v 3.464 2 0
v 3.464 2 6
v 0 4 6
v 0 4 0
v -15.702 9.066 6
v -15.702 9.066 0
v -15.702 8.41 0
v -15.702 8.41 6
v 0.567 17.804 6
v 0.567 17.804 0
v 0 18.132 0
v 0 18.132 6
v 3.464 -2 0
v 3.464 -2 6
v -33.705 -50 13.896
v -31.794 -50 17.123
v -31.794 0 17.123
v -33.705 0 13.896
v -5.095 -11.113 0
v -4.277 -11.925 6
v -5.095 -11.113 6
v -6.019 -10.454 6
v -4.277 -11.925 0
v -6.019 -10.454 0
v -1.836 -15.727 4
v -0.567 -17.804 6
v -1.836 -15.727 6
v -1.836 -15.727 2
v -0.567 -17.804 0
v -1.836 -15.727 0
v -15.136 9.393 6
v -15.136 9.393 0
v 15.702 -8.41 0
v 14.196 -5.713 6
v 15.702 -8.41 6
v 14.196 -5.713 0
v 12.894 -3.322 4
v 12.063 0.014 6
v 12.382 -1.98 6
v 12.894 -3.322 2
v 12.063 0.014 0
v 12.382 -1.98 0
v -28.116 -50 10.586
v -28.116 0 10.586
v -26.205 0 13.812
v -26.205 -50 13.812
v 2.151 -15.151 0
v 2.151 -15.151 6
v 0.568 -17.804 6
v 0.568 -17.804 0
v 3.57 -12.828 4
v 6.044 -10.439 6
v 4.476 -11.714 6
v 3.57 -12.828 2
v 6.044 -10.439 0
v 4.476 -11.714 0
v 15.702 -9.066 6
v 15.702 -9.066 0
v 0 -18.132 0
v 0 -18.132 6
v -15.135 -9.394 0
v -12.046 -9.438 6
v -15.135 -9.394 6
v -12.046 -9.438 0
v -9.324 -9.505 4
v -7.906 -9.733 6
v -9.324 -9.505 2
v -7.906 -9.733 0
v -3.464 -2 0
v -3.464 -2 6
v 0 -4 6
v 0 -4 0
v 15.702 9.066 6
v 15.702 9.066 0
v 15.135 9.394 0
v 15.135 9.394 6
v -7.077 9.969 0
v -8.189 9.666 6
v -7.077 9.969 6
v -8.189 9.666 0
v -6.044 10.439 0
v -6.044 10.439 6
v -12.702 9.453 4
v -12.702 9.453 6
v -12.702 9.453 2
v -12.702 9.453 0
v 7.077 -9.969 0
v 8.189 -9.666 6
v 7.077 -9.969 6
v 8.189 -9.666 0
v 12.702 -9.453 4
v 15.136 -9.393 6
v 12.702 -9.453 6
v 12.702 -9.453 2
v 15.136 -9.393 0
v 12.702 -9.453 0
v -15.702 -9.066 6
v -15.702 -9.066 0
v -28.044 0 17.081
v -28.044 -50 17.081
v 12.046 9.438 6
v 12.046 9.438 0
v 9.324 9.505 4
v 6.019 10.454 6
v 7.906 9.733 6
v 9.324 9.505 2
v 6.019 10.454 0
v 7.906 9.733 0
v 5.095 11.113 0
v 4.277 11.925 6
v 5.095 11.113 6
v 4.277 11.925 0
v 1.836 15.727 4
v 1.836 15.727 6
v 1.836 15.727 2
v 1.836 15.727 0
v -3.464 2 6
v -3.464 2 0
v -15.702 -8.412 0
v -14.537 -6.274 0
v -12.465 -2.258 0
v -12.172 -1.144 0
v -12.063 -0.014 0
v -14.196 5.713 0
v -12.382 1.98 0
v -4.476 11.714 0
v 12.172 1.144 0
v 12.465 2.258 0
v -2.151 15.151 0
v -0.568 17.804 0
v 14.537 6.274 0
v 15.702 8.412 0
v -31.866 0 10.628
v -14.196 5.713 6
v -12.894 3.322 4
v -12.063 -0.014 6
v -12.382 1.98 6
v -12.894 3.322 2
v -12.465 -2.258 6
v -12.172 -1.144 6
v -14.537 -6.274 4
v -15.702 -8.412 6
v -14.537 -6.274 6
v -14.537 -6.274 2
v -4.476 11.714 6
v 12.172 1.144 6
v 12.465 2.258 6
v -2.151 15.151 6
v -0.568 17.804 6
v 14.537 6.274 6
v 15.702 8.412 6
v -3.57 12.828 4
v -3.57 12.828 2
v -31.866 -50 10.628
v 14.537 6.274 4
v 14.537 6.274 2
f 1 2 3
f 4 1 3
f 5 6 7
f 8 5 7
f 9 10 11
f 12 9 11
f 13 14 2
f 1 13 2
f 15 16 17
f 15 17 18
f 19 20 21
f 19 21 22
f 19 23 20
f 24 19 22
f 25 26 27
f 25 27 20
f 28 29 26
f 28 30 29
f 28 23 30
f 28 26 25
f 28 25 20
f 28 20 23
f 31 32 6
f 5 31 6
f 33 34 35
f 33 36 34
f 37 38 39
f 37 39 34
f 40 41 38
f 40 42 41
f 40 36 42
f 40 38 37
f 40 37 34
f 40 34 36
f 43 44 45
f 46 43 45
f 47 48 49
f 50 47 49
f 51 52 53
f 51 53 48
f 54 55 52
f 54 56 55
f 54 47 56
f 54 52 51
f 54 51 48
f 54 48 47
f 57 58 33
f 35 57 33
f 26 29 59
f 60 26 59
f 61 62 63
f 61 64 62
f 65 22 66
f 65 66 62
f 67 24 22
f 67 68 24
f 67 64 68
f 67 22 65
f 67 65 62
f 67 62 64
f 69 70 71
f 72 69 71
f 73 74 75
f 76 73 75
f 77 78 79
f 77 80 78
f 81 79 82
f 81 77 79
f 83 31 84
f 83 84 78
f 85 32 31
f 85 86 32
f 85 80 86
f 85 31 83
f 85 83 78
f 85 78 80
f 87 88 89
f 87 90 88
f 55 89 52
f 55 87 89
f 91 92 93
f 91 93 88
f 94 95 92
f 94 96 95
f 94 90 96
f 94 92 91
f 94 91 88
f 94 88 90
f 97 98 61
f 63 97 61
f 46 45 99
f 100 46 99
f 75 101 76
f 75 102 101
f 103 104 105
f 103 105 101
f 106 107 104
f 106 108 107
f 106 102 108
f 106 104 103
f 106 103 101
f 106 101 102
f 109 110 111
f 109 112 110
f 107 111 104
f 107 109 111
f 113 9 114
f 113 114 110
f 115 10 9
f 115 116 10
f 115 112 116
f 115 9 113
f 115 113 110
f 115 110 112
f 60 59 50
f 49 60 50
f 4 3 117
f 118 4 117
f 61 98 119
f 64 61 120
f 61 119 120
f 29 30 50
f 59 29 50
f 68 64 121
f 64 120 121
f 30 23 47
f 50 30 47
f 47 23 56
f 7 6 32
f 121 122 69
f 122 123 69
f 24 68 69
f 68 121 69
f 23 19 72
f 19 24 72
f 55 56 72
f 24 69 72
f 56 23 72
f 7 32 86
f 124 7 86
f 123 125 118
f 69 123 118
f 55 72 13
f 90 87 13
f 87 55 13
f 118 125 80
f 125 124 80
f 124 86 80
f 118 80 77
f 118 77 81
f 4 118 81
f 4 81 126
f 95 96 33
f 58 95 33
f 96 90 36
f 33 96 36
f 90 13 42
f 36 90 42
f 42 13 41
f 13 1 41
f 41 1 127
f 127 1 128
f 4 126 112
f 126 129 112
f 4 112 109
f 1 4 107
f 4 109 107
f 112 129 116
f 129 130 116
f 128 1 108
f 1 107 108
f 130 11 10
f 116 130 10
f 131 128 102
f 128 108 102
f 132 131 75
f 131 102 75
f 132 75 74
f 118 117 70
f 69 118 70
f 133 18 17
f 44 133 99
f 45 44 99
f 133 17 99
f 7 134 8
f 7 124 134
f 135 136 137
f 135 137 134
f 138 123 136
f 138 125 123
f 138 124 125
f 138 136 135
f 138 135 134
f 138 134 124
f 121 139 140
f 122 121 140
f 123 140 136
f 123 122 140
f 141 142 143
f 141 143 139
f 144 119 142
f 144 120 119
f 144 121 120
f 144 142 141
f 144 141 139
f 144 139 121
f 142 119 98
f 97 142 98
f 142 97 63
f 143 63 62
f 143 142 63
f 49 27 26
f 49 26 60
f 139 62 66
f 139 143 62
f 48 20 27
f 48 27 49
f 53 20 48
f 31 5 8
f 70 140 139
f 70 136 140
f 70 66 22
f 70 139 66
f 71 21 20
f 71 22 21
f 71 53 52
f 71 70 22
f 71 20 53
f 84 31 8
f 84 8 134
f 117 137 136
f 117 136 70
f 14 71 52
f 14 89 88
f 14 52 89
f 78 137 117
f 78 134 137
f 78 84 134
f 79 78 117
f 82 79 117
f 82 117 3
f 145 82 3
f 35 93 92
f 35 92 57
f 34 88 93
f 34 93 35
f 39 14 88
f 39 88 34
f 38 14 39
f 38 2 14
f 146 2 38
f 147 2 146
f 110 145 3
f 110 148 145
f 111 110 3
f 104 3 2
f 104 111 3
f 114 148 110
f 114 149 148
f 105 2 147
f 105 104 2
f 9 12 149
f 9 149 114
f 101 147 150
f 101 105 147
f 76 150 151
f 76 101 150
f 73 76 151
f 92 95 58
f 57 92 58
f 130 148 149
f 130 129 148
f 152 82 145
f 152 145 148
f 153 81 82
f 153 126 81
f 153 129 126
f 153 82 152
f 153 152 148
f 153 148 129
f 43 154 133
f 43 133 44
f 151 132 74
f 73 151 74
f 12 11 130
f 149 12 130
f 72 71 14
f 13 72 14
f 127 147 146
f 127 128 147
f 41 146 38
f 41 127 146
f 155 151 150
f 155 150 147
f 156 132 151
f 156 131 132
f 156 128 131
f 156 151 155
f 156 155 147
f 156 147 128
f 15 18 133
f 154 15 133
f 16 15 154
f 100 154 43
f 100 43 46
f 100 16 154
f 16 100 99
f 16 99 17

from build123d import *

# Parameters (mm, degrees)
F1_DEPTH = 50
F3_DEPTH = 6
F5_DEPTH = 25


with BuildPart() as f1:
    # F0 (on Front) → F1 (new body)
    with BuildSketch(Plane.XZ):
        Polygon((-26.2049326301, 13.8121203759), (-28.0435276902, 17.0807340419), (-31.7935276902, 17.1227708456), (-33.7049326301, 13.8961939833), (-31.8663375699, 10.6275803172), (-28.1163375699, 10.5855435136), align=None)
    extrude(amount=F1_DEPTH)


with BuildPart() as f3:
    # F2 (on Top) → F3 (new body)
    with BuildSketch(Plane.XY):
        with BuildLine():
            Line((-12.0627175372, -0.0144388362), (-6.0438631676, 10.4394004078))
            add(Edge.make_bspline(
                [(-15.1358744038, 9.3928904921), (-13.4915543772, 9.7654312673), (-8.9864380154, 8.7432919796), (-6.0438631676, 10.4394004078)],
                knots=[0.0120150375, 0.0120150375, 0.0120150375, 0.0120150375, 0.0832761836, 0.0832761836, 0.0832761836, 0.0832761836], degree=3))
            Line((-15.1358744038, 9.3928904921), (-15.702418983, 9.0657958268))
            Line((-15.702418983, 9.0657958268), (-15.702418983, 8.4101986204))
            add(Edge.make_bspline(
                [(-12.0627175372, -0.0144388362), (-12.0602995384, 3.3869694731), (-15.2024796508, 6.7943184808), (-15.702418983, 8.4101986204)],
                knots=[0.9166095169, 0.9166095169, 0.9166095169, 0.9166095169, 0.9879757698, 0.9879757698, 0.9879757698, 0.9879757698], degree=3))
        make_face()
        Polygon((6.0438631676, -10.4394004078), (12.0627175372, 0.0144388362), (6.0188543696, 10.453839244), (-6.0438631676, 10.4394004078), (-12.0627175372, -0.0144388362), (-6.0188543696, -10.453839244), align=None)
        with BuildLine():
            add(Edge.make_bspline(
                [(0.5665445792, 17.8044969882), (1.7113343678, 16.5667444608), (3.0786939593, 12.1541296007), (6.0188543696, 10.453839244)],
                knots=[0.1786817042, 0.1786817042, 0.1786817042, 0.1786817042, 0.2499428502, 0.2499428502, 0.2499428502, 0.2499428502], degree=3))
            Line((0.5665445792, 17.8044969882), (0, 18.1315916535))
            Line((0, 18.1315916535), (-0.5677638354, 17.8037930503))
            add(Edge.make_bspline(
                [(-6.0438631676, 10.4394004078), (-3.0969481636, 12.1380105141), (-1.7171874196, 16.5628928185), (-0.5677638354, 17.8037930503)],
                knots=[0.0832761836, 0.0832761836, 0.0832761836, 0.0832761836, 0.1546424364, 0.1546424364, 0.1546424364, 0.1546424364], degree=3))
            Line((-6.0438631676, 10.4394004078), (6.0188543696, 10.453839244))
        make_face()
        with BuildLine():
            Line((15.702418983, 8.4116064961), (15.702418983, 9.0657958268))
            Line((15.702418983, 9.0657958268), (15.1346551476, 9.39359443))
            add(Edge.make_bspline(
                [(6.0188543696, 10.453839244), (8.9633513748, 8.751041041), (13.4852922312, 9.7685743377), (15.1346551476, 9.39359443)],
                knots=[0.2499428502, 0.2499428502, 0.2499428502, 0.2499428502, 0.3213091031, 0.3213091031, 0.3213091031, 0.3213091031], degree=3))
            Line((6.0188543696, 10.453839244), (12.0627175372, 0.0144388362))
            add(Edge.make_bspline(
                [(15.702418983, 8.4116064961), (15.2028887449, 6.8013131935), (12.0651319747, 3.4108376211), (12.0627175372, 0.0144388362)],
                knots=[0.3453483708, 0.3453483708, 0.3453483708, 0.3453483708, 0.4166095169, 0.4166095169, 0.4166095169, 0.4166095169], degree=3))
        make_face()
        with BuildLine():
            Line((15.702418983, -9.0657958268), (15.702418983, -8.4101986204))
            add(Edge.make_bspline(
                [(12.0627175372, 0.0144388362), (12.0602995384, -3.3869694731), (15.2024796508, -6.7943184808), (15.702418983, -8.4101986204)],
                knots=[0.4166095169, 0.4166095169, 0.4166095169, 0.4166095169, 0.4879757698, 0.4879757698, 0.4879757698, 0.4879757698], degree=3))
            Line((12.0627175372, 0.0144388362), (6.0438631676, -10.4394004078))
            add(Edge.make_bspline(
                [(15.1358744038, -9.3928904921), (13.4915543772, -9.7654312673), (8.9864380154, -8.7432919796), (6.0438631676, -10.4394004078)],
                knots=[0.5120150375, 0.5120150375, 0.5120150375, 0.5120150375, 0.5832761836, 0.5832761836, 0.5832761836, 0.5832761836], degree=3))
            Line((15.1358744038, -9.3928904921), (15.702418983, -9.0657958268))
        make_face()
        with BuildLine():
            add(Edge.make_bspline(
                [(6.0438631676, -10.4394004078), (3.0969481636, -12.1380105141), (1.7171874196, -16.5628928185), (0.5677638354, -17.8037930503)],
                knots=[0.5832761836, 0.5832761836, 0.5832761836, 0.5832761836, 0.6546424364, 0.6546424364, 0.6546424364, 0.6546424364], degree=3))
            Line((6.0438631676, -10.4394004078), (-6.0188543696, -10.453839244))
            add(Edge.make_bspline(
                [(-0.5665445792, -17.8044969882), (-1.7113343678, -16.5667444608), (-3.0786939593, -12.1541296007), (-6.0188543696, -10.453839244)],
                knots=[0.6786817042, 0.6786817042, 0.6786817042, 0.6786817042, 0.7499428502, 0.7499428502, 0.7499428502, 0.7499428502], degree=3))
            Line((-0.5665445792, -17.8044969882), (0, -18.1315916535))
            Line((0, -18.1315916535), (0.5677638354, -17.8037930503))
        make_face()
        with BuildLine():
            add(Edge.make_bspline(
                [(-6.0188543696, -10.453839244), (-8.9633513748, -8.751041041), (-13.4852922312, -9.7685743377), (-15.1346551476, -9.39359443)],
                knots=[0.7499428502, 0.7499428502, 0.7499428502, 0.7499428502, 0.8213091031, 0.8213091031, 0.8213091031, 0.8213091031], degree=3))
            Line((-6.0188543696, -10.453839244), (-12.0627175372, -0.0144388362))
            add(Edge.make_bspline(
                [(-15.702418983, -8.4116064961), (-15.2028887449, -6.8013131935), (-12.0651319747, -3.4108376211), (-12.0627175372, -0.0144388362)],
                knots=[0.8453483708, 0.8453483708, 0.8453483708, 0.8453483708, 0.9166095169, 0.9166095169, 0.9166095169, 0.9166095169], degree=3))
            Line((-15.702418983, -8.4116064961), (-15.702418983, -9.0657958268))
            Line((-15.702418983, -9.0657958268), (-15.1346551476, -9.39359443))
        make_face()
    extrude(amount=F3_DEPTH)

    # F4 (on face) → F5 (cut)
    with BuildSketch(Plane.XY.offset(6)):
        Polygon((3.4641016151, -2), (3.4641016151, 2), (0, 4), (-3.4641016151, 2), (-3.4641016151, -2), (0, -4), align=None)
    extrude(amount=-F5_DEPTH, mode=Mode.SUBTRACT)


solid = Compound([f1.part, f3.part])
